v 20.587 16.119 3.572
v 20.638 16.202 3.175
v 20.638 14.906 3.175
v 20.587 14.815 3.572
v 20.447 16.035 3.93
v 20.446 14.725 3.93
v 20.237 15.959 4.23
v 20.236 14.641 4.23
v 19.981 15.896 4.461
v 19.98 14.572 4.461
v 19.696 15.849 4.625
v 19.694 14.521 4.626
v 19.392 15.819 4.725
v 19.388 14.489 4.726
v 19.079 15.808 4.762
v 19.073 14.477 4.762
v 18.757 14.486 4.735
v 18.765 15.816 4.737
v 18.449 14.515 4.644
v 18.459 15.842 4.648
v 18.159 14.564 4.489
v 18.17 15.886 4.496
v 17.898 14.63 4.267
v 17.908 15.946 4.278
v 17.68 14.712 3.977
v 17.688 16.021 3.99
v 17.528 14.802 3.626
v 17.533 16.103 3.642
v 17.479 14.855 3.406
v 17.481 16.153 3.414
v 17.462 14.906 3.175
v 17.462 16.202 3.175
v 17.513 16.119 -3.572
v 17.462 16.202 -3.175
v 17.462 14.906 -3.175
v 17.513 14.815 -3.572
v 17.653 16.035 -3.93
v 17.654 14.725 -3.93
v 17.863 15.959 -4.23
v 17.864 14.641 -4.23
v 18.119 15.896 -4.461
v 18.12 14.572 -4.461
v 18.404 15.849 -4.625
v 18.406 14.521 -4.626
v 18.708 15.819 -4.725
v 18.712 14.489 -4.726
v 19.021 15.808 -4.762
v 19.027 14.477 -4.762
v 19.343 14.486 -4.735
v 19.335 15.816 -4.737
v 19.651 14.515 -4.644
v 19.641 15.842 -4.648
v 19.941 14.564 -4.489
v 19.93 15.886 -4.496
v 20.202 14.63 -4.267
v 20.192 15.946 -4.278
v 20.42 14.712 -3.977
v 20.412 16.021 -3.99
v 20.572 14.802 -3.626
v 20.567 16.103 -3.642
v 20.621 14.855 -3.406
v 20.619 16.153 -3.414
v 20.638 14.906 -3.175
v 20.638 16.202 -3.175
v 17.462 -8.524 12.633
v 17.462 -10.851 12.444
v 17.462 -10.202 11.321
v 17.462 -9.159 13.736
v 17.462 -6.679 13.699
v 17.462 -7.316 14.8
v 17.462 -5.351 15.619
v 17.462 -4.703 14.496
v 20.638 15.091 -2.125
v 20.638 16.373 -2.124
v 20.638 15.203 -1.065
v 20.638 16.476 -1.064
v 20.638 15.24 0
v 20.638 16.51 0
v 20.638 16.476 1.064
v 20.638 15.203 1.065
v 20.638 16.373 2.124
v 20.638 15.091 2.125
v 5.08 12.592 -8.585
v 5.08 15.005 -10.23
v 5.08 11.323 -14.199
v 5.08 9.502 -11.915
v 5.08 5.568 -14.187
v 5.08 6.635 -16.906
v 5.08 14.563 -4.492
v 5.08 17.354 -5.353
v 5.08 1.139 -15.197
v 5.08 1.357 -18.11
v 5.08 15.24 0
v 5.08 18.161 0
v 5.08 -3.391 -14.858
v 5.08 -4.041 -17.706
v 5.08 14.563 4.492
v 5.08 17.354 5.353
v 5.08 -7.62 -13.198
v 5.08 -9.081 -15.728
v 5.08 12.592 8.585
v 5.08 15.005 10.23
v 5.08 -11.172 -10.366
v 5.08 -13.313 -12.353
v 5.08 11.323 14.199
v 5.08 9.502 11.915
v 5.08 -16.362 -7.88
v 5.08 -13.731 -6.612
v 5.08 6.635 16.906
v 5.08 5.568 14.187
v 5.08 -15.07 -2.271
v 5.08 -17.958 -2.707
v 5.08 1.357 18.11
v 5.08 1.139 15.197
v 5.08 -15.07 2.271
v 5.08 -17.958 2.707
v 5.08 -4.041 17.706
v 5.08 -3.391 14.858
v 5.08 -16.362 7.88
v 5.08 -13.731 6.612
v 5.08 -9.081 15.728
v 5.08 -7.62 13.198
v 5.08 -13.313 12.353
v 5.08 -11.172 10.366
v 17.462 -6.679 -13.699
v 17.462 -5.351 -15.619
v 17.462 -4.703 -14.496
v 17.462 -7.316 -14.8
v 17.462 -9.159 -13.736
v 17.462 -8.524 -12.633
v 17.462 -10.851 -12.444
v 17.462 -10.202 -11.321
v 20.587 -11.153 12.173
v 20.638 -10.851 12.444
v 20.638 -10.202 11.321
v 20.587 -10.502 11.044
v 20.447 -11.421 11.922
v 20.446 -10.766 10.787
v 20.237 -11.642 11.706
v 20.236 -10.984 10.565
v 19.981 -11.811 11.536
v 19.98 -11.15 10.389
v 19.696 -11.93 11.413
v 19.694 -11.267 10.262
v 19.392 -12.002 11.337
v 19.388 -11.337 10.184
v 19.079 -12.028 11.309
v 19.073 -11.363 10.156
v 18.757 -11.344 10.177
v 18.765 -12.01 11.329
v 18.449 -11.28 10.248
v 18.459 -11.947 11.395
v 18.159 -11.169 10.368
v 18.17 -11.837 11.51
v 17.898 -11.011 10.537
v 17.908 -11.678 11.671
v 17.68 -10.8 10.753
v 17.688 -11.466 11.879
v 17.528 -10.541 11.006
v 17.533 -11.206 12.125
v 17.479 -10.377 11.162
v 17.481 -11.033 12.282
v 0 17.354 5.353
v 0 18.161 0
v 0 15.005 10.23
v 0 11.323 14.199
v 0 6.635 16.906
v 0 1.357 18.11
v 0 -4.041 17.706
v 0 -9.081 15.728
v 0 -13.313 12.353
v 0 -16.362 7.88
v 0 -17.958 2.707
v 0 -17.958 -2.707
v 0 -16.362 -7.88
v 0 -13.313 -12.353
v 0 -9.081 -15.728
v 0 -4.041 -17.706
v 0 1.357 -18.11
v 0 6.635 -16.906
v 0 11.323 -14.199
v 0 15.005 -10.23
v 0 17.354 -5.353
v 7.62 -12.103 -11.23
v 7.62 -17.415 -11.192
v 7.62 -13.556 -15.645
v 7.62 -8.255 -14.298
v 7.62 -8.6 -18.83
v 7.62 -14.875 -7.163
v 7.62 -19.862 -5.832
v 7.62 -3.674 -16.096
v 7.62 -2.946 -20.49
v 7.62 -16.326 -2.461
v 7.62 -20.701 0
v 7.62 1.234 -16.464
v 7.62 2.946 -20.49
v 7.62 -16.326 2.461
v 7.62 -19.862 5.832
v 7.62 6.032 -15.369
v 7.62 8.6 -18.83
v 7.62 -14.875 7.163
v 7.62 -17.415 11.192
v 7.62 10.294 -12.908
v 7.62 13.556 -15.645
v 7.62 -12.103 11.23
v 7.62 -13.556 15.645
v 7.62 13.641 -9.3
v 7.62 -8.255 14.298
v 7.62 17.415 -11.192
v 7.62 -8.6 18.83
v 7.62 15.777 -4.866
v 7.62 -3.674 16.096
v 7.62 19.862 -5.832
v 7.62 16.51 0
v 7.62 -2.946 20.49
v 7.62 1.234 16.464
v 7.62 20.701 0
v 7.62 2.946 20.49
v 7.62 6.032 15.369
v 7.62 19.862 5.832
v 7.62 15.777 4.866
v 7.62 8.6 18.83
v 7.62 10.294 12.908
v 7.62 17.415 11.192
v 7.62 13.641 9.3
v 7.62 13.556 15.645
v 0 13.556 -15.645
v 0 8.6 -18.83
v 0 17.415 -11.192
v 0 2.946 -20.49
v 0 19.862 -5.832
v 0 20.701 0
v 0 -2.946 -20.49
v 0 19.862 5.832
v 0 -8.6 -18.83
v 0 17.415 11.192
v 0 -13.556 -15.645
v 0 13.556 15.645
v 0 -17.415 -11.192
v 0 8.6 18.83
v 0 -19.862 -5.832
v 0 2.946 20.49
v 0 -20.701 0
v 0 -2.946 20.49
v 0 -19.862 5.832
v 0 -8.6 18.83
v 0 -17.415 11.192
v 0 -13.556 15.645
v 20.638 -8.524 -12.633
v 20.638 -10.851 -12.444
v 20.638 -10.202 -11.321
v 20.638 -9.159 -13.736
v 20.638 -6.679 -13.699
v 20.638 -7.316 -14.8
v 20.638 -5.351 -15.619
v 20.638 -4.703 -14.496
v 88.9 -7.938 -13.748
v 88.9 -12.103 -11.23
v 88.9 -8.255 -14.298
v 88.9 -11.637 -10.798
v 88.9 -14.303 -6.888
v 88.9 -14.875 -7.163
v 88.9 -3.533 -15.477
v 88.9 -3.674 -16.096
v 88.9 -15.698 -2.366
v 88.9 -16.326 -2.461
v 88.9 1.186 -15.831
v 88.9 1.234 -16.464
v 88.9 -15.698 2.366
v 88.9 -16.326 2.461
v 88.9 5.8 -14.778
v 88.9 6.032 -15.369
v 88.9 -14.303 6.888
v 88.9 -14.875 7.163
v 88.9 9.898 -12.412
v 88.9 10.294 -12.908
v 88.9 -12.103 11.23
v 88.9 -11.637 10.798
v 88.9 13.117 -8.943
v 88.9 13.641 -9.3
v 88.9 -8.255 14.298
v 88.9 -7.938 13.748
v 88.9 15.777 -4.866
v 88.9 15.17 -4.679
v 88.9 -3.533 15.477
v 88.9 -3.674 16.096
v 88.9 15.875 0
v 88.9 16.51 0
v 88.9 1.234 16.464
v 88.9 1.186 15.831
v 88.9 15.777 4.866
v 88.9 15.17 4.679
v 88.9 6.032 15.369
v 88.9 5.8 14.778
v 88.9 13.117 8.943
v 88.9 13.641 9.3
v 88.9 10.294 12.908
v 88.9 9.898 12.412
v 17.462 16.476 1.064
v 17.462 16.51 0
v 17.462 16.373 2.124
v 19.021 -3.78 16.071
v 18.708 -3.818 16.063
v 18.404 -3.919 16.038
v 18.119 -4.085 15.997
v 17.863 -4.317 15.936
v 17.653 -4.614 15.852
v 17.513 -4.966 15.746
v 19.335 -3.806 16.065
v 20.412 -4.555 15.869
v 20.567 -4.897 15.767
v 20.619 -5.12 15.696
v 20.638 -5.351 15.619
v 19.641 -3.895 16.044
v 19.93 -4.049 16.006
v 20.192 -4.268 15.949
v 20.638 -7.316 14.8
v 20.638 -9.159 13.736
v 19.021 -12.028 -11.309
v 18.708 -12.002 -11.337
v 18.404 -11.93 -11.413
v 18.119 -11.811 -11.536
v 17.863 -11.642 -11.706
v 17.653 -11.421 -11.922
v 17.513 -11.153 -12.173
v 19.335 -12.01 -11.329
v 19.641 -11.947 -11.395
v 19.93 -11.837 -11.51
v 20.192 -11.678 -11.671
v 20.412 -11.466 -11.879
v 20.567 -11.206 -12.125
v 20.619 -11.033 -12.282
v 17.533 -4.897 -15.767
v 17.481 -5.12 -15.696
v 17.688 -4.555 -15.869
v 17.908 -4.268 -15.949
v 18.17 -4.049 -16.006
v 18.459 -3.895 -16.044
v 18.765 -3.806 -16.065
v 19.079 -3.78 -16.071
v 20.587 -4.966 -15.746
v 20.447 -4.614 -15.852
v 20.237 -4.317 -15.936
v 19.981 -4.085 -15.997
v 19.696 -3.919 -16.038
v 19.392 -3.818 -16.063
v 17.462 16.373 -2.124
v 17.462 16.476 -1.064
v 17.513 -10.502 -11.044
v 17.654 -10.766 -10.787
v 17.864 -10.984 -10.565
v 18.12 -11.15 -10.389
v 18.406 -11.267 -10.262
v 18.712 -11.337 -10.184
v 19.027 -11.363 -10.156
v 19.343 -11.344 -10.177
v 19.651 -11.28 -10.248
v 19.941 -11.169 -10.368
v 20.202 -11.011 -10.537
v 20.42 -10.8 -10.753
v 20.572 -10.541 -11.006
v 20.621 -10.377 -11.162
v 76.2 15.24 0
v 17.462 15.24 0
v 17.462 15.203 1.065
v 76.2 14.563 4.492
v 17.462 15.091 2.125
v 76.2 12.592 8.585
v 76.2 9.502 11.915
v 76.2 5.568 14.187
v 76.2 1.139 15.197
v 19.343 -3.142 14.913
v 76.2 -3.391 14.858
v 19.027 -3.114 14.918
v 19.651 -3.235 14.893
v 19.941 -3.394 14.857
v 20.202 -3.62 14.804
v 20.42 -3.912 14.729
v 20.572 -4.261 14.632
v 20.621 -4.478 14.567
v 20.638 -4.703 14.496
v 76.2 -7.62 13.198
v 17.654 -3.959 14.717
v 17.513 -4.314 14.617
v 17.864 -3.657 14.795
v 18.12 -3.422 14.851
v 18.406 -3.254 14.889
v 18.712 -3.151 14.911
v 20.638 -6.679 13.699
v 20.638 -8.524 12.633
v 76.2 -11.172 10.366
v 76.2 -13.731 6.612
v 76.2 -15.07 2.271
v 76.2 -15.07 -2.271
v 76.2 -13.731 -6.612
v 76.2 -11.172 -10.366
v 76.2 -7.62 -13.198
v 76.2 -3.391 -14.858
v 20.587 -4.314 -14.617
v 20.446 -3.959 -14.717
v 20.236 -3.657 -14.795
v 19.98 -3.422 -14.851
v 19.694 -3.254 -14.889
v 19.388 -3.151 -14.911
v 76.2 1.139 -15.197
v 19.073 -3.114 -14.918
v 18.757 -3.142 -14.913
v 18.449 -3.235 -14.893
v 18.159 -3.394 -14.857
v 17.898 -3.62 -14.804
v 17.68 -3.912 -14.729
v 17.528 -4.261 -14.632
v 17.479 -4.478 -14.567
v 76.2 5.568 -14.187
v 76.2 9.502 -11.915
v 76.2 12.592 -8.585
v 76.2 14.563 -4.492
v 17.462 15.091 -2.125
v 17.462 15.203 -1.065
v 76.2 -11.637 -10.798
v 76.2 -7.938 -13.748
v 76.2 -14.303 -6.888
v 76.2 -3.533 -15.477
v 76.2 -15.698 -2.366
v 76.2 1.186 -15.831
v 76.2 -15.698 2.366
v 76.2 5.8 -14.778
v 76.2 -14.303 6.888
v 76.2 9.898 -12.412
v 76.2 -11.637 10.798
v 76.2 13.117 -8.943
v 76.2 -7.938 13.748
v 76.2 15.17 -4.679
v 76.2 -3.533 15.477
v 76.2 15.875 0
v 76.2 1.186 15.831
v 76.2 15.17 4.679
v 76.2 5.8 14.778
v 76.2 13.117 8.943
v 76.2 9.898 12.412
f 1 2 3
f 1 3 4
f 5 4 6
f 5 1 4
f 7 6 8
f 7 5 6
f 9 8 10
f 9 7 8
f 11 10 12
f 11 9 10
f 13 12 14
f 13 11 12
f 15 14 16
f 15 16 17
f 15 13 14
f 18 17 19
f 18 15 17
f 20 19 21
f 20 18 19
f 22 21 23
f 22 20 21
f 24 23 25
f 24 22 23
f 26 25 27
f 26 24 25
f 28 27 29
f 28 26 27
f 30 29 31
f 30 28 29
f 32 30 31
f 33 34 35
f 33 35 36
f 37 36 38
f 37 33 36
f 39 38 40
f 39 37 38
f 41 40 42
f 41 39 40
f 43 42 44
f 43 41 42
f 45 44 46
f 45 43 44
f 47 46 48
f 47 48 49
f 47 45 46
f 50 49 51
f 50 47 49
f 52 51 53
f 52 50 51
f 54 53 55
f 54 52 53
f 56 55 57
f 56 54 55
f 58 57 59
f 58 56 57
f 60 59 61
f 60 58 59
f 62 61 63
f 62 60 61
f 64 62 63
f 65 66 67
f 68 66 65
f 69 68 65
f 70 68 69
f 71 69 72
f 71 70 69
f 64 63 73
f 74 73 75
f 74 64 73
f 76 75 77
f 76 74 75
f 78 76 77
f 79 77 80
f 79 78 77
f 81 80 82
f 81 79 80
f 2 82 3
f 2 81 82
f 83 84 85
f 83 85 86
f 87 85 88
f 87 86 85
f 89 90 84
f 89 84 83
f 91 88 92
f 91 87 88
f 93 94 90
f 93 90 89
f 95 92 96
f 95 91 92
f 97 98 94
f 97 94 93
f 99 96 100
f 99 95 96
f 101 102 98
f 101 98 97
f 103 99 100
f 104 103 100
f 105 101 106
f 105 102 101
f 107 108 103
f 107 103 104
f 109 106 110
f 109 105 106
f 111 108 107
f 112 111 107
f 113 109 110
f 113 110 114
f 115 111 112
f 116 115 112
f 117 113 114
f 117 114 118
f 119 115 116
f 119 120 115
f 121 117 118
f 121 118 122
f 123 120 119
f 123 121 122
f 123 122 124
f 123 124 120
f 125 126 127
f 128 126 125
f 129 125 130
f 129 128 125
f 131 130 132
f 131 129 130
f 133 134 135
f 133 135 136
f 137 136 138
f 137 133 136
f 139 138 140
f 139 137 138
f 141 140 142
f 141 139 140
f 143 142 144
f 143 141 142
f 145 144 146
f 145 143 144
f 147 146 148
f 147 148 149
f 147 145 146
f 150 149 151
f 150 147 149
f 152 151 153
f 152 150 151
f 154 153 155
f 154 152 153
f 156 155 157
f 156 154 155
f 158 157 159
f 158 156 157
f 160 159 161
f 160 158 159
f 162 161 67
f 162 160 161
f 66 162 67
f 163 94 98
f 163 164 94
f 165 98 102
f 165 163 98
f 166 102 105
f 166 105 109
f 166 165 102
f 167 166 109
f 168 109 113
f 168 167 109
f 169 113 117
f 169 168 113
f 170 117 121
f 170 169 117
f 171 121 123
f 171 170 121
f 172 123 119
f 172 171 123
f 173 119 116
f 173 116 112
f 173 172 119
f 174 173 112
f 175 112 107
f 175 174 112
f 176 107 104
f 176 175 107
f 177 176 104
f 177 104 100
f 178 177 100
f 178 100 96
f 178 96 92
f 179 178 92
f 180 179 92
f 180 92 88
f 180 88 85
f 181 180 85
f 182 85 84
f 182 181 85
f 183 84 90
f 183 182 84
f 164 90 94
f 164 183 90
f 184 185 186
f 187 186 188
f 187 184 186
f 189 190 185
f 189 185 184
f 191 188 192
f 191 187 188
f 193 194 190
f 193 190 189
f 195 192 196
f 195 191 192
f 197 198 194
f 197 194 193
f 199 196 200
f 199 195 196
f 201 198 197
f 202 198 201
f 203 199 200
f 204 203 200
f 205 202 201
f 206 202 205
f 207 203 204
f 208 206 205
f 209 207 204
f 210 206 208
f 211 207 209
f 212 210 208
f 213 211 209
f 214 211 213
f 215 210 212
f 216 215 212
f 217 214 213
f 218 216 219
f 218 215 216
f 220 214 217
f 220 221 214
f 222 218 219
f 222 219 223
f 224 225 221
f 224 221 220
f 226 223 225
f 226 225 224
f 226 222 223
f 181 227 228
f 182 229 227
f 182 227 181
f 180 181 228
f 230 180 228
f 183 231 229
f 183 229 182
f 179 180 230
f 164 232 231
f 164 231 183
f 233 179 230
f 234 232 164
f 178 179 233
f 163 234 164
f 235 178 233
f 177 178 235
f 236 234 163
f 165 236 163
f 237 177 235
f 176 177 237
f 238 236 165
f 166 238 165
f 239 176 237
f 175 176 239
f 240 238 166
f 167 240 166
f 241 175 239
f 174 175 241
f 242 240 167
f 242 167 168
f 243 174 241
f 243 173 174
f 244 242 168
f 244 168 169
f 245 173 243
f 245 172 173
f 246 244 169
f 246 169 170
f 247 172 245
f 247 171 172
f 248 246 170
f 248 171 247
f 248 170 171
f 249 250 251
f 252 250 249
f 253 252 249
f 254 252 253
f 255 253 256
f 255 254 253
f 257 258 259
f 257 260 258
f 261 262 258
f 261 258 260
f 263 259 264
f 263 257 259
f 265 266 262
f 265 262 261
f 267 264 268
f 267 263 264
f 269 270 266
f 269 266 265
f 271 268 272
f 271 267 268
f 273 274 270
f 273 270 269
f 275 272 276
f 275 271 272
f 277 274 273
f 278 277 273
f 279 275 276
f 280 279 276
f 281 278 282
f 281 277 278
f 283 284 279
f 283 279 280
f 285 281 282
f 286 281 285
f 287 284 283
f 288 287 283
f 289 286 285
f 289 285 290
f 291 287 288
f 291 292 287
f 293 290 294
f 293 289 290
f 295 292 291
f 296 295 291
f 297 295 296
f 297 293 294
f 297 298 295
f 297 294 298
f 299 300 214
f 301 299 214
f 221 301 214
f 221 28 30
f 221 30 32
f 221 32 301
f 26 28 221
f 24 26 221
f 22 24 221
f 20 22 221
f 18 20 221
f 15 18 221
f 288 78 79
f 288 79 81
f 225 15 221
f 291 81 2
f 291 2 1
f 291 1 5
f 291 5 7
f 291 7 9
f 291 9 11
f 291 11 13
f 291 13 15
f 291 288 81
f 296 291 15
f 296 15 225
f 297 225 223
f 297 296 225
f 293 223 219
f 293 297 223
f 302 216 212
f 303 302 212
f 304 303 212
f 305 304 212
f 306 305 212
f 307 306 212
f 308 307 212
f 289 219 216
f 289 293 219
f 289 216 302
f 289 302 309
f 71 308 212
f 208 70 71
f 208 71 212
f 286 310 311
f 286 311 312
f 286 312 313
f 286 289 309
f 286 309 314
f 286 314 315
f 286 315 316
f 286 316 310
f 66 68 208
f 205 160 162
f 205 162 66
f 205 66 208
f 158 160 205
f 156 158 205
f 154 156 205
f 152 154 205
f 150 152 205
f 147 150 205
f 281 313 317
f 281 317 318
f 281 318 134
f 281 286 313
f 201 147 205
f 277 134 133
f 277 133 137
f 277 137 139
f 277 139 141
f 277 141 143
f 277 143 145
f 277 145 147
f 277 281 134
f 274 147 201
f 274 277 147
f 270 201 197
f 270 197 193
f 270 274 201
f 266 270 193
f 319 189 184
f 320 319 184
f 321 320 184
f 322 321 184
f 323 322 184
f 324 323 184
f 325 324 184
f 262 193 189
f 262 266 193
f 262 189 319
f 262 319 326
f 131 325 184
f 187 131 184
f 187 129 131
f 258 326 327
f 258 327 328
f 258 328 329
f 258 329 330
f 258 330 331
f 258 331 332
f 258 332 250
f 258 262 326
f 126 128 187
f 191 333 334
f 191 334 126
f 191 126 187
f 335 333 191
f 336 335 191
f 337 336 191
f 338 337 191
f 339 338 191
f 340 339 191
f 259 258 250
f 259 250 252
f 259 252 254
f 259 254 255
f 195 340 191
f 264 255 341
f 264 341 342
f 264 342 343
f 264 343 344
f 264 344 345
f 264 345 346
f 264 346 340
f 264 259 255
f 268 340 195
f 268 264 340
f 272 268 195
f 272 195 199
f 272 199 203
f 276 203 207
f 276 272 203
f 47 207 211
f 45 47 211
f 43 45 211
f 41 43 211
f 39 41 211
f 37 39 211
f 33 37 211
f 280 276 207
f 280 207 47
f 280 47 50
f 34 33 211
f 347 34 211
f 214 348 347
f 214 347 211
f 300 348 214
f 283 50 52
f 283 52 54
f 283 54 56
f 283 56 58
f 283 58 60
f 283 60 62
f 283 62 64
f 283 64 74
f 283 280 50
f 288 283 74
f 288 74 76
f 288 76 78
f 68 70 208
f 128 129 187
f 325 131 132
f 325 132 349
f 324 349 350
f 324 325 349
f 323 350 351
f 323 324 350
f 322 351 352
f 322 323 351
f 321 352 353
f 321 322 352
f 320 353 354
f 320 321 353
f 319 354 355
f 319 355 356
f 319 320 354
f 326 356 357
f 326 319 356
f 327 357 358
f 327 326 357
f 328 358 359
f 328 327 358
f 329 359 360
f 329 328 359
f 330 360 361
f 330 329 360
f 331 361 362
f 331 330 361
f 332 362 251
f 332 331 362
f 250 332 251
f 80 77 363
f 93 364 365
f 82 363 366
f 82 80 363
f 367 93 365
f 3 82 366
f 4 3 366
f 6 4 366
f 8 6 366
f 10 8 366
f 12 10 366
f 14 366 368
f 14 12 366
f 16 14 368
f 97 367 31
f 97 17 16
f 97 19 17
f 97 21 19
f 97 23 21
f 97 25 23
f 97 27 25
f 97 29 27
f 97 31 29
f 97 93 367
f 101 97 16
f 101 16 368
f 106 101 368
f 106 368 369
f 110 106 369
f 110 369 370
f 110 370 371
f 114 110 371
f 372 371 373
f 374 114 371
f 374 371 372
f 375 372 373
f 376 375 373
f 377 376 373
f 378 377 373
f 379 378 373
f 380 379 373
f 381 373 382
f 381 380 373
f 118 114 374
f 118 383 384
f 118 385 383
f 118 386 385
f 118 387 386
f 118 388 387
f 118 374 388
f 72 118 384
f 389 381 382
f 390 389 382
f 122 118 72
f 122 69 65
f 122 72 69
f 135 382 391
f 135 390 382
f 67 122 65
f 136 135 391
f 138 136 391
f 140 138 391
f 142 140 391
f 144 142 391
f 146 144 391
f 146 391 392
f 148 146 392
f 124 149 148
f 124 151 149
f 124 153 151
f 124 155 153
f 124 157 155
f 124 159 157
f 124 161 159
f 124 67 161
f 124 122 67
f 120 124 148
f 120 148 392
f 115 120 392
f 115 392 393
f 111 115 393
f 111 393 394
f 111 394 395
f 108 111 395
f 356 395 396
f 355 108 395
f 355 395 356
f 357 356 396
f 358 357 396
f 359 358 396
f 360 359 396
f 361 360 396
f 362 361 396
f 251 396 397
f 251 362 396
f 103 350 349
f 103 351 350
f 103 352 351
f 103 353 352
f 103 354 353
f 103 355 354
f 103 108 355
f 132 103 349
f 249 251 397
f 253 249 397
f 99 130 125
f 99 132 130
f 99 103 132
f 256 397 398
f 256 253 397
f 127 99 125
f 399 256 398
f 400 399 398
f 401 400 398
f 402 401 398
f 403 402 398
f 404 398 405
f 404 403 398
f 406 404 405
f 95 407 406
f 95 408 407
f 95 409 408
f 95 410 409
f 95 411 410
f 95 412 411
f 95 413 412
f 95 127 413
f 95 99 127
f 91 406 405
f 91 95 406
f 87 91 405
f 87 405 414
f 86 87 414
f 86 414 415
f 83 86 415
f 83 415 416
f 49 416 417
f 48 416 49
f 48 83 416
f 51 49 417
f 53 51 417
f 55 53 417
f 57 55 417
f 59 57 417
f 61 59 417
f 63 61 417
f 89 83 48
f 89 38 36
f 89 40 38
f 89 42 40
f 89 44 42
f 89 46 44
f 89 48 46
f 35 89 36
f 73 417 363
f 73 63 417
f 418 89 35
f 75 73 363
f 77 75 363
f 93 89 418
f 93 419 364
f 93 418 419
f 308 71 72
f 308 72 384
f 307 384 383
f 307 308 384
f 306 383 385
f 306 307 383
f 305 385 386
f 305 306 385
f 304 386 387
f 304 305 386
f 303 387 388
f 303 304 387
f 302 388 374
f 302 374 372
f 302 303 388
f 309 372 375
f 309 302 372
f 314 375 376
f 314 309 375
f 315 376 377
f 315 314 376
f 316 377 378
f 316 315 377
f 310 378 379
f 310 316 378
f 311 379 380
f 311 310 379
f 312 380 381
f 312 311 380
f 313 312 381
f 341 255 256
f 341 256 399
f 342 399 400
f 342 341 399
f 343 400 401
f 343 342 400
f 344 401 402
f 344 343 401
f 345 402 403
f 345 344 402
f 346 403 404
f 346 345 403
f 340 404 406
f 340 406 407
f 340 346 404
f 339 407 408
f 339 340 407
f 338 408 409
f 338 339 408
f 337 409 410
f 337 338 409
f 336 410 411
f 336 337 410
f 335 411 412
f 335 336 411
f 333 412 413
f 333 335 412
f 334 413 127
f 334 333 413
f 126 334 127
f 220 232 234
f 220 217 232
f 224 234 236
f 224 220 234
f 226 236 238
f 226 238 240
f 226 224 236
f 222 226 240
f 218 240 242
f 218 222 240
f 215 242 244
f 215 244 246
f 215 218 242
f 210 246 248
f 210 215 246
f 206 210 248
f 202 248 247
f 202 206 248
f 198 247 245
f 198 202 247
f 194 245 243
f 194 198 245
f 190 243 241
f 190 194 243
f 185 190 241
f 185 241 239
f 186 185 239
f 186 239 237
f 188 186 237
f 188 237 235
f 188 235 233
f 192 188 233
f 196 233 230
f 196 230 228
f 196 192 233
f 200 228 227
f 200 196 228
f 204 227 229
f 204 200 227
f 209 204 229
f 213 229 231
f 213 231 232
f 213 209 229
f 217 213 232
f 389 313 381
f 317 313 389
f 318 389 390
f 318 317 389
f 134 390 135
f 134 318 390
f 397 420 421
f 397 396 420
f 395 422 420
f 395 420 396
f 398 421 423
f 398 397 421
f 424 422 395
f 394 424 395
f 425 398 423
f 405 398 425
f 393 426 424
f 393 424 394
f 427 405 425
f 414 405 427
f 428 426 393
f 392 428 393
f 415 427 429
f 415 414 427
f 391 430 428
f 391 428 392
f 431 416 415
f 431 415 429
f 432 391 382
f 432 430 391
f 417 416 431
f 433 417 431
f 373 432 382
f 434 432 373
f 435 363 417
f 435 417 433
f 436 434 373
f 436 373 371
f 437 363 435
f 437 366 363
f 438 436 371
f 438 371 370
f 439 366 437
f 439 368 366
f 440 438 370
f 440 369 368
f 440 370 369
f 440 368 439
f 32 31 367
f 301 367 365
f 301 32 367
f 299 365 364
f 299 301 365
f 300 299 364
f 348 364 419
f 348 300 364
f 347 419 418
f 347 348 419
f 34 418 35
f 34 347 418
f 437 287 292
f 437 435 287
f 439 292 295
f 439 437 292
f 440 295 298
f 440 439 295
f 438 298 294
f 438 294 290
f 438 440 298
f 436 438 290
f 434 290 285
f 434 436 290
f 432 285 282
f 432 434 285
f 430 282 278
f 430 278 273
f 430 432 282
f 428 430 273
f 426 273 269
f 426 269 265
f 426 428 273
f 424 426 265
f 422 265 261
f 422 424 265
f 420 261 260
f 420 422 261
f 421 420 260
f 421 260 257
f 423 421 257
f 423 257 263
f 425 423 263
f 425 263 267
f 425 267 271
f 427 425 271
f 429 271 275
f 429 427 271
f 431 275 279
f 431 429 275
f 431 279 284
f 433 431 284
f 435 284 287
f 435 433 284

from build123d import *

# Parameters (mm, degrees)
CUT_EXTRUDE1_DEPTH = 5.08
CIRPATTERN1_COUNT  = 3


# Read off the part's stored shape, not the designer's step: Revolve1
with BuildPart() as part:
    # Revolve1 outline → Revolve1 (revolve)
    with BuildSketch(Plane.YX):
        Polygon((20.701, 0), (20.701, 7.62), (16.51, 7.62), (16.51, 88.9), (15.875, 88.9), (15.875, 76.2), (15.24, 76.2), (15.24, 5.08), (18.161, 5.08), (18.161, 0), align=None)
    revolve(axis=Axis((0, 0, 0), (1, 0, 0)))

    # Sketch2 → Cut-Extrude1 (cut)
    with BuildSketch(Plane(origin=(0, 16.51, 0), x_dir=(1, 0, 0), z_dir=(0, 1, 0))):
        with BuildLine():
            Line((20.6375, 3.175), (20.6375, -3.175))
            ThreePointArc((20.6375, -3.175), (19.05, -4.7625), (17.4625, -3.175))
            Line((17.4625, -3.175), (17.4625, 3.175))
            ThreePointArc((17.4625, 3.175), (19.05, 4.7625), (20.6375, 3.175))
        make_face()
    cut_extrude1 = extrude(amount=-CUT_EXTRUDE1_DEPTH, mode=Mode.SUBTRACT)

    # CirPattern1: Cut-Extrude1 ×3 about axis
    cirpattern1_axis = Axis((0, 0, 0), (1, 0, 0))
    for i in range(1, CIRPATTERN1_COUNT):
        add(cut_extrude1.rotate(cirpattern1_axis, i * 360 / CIRPATTERN1_COUNT), mode=Mode.SUBTRACT)


solid = part.part
